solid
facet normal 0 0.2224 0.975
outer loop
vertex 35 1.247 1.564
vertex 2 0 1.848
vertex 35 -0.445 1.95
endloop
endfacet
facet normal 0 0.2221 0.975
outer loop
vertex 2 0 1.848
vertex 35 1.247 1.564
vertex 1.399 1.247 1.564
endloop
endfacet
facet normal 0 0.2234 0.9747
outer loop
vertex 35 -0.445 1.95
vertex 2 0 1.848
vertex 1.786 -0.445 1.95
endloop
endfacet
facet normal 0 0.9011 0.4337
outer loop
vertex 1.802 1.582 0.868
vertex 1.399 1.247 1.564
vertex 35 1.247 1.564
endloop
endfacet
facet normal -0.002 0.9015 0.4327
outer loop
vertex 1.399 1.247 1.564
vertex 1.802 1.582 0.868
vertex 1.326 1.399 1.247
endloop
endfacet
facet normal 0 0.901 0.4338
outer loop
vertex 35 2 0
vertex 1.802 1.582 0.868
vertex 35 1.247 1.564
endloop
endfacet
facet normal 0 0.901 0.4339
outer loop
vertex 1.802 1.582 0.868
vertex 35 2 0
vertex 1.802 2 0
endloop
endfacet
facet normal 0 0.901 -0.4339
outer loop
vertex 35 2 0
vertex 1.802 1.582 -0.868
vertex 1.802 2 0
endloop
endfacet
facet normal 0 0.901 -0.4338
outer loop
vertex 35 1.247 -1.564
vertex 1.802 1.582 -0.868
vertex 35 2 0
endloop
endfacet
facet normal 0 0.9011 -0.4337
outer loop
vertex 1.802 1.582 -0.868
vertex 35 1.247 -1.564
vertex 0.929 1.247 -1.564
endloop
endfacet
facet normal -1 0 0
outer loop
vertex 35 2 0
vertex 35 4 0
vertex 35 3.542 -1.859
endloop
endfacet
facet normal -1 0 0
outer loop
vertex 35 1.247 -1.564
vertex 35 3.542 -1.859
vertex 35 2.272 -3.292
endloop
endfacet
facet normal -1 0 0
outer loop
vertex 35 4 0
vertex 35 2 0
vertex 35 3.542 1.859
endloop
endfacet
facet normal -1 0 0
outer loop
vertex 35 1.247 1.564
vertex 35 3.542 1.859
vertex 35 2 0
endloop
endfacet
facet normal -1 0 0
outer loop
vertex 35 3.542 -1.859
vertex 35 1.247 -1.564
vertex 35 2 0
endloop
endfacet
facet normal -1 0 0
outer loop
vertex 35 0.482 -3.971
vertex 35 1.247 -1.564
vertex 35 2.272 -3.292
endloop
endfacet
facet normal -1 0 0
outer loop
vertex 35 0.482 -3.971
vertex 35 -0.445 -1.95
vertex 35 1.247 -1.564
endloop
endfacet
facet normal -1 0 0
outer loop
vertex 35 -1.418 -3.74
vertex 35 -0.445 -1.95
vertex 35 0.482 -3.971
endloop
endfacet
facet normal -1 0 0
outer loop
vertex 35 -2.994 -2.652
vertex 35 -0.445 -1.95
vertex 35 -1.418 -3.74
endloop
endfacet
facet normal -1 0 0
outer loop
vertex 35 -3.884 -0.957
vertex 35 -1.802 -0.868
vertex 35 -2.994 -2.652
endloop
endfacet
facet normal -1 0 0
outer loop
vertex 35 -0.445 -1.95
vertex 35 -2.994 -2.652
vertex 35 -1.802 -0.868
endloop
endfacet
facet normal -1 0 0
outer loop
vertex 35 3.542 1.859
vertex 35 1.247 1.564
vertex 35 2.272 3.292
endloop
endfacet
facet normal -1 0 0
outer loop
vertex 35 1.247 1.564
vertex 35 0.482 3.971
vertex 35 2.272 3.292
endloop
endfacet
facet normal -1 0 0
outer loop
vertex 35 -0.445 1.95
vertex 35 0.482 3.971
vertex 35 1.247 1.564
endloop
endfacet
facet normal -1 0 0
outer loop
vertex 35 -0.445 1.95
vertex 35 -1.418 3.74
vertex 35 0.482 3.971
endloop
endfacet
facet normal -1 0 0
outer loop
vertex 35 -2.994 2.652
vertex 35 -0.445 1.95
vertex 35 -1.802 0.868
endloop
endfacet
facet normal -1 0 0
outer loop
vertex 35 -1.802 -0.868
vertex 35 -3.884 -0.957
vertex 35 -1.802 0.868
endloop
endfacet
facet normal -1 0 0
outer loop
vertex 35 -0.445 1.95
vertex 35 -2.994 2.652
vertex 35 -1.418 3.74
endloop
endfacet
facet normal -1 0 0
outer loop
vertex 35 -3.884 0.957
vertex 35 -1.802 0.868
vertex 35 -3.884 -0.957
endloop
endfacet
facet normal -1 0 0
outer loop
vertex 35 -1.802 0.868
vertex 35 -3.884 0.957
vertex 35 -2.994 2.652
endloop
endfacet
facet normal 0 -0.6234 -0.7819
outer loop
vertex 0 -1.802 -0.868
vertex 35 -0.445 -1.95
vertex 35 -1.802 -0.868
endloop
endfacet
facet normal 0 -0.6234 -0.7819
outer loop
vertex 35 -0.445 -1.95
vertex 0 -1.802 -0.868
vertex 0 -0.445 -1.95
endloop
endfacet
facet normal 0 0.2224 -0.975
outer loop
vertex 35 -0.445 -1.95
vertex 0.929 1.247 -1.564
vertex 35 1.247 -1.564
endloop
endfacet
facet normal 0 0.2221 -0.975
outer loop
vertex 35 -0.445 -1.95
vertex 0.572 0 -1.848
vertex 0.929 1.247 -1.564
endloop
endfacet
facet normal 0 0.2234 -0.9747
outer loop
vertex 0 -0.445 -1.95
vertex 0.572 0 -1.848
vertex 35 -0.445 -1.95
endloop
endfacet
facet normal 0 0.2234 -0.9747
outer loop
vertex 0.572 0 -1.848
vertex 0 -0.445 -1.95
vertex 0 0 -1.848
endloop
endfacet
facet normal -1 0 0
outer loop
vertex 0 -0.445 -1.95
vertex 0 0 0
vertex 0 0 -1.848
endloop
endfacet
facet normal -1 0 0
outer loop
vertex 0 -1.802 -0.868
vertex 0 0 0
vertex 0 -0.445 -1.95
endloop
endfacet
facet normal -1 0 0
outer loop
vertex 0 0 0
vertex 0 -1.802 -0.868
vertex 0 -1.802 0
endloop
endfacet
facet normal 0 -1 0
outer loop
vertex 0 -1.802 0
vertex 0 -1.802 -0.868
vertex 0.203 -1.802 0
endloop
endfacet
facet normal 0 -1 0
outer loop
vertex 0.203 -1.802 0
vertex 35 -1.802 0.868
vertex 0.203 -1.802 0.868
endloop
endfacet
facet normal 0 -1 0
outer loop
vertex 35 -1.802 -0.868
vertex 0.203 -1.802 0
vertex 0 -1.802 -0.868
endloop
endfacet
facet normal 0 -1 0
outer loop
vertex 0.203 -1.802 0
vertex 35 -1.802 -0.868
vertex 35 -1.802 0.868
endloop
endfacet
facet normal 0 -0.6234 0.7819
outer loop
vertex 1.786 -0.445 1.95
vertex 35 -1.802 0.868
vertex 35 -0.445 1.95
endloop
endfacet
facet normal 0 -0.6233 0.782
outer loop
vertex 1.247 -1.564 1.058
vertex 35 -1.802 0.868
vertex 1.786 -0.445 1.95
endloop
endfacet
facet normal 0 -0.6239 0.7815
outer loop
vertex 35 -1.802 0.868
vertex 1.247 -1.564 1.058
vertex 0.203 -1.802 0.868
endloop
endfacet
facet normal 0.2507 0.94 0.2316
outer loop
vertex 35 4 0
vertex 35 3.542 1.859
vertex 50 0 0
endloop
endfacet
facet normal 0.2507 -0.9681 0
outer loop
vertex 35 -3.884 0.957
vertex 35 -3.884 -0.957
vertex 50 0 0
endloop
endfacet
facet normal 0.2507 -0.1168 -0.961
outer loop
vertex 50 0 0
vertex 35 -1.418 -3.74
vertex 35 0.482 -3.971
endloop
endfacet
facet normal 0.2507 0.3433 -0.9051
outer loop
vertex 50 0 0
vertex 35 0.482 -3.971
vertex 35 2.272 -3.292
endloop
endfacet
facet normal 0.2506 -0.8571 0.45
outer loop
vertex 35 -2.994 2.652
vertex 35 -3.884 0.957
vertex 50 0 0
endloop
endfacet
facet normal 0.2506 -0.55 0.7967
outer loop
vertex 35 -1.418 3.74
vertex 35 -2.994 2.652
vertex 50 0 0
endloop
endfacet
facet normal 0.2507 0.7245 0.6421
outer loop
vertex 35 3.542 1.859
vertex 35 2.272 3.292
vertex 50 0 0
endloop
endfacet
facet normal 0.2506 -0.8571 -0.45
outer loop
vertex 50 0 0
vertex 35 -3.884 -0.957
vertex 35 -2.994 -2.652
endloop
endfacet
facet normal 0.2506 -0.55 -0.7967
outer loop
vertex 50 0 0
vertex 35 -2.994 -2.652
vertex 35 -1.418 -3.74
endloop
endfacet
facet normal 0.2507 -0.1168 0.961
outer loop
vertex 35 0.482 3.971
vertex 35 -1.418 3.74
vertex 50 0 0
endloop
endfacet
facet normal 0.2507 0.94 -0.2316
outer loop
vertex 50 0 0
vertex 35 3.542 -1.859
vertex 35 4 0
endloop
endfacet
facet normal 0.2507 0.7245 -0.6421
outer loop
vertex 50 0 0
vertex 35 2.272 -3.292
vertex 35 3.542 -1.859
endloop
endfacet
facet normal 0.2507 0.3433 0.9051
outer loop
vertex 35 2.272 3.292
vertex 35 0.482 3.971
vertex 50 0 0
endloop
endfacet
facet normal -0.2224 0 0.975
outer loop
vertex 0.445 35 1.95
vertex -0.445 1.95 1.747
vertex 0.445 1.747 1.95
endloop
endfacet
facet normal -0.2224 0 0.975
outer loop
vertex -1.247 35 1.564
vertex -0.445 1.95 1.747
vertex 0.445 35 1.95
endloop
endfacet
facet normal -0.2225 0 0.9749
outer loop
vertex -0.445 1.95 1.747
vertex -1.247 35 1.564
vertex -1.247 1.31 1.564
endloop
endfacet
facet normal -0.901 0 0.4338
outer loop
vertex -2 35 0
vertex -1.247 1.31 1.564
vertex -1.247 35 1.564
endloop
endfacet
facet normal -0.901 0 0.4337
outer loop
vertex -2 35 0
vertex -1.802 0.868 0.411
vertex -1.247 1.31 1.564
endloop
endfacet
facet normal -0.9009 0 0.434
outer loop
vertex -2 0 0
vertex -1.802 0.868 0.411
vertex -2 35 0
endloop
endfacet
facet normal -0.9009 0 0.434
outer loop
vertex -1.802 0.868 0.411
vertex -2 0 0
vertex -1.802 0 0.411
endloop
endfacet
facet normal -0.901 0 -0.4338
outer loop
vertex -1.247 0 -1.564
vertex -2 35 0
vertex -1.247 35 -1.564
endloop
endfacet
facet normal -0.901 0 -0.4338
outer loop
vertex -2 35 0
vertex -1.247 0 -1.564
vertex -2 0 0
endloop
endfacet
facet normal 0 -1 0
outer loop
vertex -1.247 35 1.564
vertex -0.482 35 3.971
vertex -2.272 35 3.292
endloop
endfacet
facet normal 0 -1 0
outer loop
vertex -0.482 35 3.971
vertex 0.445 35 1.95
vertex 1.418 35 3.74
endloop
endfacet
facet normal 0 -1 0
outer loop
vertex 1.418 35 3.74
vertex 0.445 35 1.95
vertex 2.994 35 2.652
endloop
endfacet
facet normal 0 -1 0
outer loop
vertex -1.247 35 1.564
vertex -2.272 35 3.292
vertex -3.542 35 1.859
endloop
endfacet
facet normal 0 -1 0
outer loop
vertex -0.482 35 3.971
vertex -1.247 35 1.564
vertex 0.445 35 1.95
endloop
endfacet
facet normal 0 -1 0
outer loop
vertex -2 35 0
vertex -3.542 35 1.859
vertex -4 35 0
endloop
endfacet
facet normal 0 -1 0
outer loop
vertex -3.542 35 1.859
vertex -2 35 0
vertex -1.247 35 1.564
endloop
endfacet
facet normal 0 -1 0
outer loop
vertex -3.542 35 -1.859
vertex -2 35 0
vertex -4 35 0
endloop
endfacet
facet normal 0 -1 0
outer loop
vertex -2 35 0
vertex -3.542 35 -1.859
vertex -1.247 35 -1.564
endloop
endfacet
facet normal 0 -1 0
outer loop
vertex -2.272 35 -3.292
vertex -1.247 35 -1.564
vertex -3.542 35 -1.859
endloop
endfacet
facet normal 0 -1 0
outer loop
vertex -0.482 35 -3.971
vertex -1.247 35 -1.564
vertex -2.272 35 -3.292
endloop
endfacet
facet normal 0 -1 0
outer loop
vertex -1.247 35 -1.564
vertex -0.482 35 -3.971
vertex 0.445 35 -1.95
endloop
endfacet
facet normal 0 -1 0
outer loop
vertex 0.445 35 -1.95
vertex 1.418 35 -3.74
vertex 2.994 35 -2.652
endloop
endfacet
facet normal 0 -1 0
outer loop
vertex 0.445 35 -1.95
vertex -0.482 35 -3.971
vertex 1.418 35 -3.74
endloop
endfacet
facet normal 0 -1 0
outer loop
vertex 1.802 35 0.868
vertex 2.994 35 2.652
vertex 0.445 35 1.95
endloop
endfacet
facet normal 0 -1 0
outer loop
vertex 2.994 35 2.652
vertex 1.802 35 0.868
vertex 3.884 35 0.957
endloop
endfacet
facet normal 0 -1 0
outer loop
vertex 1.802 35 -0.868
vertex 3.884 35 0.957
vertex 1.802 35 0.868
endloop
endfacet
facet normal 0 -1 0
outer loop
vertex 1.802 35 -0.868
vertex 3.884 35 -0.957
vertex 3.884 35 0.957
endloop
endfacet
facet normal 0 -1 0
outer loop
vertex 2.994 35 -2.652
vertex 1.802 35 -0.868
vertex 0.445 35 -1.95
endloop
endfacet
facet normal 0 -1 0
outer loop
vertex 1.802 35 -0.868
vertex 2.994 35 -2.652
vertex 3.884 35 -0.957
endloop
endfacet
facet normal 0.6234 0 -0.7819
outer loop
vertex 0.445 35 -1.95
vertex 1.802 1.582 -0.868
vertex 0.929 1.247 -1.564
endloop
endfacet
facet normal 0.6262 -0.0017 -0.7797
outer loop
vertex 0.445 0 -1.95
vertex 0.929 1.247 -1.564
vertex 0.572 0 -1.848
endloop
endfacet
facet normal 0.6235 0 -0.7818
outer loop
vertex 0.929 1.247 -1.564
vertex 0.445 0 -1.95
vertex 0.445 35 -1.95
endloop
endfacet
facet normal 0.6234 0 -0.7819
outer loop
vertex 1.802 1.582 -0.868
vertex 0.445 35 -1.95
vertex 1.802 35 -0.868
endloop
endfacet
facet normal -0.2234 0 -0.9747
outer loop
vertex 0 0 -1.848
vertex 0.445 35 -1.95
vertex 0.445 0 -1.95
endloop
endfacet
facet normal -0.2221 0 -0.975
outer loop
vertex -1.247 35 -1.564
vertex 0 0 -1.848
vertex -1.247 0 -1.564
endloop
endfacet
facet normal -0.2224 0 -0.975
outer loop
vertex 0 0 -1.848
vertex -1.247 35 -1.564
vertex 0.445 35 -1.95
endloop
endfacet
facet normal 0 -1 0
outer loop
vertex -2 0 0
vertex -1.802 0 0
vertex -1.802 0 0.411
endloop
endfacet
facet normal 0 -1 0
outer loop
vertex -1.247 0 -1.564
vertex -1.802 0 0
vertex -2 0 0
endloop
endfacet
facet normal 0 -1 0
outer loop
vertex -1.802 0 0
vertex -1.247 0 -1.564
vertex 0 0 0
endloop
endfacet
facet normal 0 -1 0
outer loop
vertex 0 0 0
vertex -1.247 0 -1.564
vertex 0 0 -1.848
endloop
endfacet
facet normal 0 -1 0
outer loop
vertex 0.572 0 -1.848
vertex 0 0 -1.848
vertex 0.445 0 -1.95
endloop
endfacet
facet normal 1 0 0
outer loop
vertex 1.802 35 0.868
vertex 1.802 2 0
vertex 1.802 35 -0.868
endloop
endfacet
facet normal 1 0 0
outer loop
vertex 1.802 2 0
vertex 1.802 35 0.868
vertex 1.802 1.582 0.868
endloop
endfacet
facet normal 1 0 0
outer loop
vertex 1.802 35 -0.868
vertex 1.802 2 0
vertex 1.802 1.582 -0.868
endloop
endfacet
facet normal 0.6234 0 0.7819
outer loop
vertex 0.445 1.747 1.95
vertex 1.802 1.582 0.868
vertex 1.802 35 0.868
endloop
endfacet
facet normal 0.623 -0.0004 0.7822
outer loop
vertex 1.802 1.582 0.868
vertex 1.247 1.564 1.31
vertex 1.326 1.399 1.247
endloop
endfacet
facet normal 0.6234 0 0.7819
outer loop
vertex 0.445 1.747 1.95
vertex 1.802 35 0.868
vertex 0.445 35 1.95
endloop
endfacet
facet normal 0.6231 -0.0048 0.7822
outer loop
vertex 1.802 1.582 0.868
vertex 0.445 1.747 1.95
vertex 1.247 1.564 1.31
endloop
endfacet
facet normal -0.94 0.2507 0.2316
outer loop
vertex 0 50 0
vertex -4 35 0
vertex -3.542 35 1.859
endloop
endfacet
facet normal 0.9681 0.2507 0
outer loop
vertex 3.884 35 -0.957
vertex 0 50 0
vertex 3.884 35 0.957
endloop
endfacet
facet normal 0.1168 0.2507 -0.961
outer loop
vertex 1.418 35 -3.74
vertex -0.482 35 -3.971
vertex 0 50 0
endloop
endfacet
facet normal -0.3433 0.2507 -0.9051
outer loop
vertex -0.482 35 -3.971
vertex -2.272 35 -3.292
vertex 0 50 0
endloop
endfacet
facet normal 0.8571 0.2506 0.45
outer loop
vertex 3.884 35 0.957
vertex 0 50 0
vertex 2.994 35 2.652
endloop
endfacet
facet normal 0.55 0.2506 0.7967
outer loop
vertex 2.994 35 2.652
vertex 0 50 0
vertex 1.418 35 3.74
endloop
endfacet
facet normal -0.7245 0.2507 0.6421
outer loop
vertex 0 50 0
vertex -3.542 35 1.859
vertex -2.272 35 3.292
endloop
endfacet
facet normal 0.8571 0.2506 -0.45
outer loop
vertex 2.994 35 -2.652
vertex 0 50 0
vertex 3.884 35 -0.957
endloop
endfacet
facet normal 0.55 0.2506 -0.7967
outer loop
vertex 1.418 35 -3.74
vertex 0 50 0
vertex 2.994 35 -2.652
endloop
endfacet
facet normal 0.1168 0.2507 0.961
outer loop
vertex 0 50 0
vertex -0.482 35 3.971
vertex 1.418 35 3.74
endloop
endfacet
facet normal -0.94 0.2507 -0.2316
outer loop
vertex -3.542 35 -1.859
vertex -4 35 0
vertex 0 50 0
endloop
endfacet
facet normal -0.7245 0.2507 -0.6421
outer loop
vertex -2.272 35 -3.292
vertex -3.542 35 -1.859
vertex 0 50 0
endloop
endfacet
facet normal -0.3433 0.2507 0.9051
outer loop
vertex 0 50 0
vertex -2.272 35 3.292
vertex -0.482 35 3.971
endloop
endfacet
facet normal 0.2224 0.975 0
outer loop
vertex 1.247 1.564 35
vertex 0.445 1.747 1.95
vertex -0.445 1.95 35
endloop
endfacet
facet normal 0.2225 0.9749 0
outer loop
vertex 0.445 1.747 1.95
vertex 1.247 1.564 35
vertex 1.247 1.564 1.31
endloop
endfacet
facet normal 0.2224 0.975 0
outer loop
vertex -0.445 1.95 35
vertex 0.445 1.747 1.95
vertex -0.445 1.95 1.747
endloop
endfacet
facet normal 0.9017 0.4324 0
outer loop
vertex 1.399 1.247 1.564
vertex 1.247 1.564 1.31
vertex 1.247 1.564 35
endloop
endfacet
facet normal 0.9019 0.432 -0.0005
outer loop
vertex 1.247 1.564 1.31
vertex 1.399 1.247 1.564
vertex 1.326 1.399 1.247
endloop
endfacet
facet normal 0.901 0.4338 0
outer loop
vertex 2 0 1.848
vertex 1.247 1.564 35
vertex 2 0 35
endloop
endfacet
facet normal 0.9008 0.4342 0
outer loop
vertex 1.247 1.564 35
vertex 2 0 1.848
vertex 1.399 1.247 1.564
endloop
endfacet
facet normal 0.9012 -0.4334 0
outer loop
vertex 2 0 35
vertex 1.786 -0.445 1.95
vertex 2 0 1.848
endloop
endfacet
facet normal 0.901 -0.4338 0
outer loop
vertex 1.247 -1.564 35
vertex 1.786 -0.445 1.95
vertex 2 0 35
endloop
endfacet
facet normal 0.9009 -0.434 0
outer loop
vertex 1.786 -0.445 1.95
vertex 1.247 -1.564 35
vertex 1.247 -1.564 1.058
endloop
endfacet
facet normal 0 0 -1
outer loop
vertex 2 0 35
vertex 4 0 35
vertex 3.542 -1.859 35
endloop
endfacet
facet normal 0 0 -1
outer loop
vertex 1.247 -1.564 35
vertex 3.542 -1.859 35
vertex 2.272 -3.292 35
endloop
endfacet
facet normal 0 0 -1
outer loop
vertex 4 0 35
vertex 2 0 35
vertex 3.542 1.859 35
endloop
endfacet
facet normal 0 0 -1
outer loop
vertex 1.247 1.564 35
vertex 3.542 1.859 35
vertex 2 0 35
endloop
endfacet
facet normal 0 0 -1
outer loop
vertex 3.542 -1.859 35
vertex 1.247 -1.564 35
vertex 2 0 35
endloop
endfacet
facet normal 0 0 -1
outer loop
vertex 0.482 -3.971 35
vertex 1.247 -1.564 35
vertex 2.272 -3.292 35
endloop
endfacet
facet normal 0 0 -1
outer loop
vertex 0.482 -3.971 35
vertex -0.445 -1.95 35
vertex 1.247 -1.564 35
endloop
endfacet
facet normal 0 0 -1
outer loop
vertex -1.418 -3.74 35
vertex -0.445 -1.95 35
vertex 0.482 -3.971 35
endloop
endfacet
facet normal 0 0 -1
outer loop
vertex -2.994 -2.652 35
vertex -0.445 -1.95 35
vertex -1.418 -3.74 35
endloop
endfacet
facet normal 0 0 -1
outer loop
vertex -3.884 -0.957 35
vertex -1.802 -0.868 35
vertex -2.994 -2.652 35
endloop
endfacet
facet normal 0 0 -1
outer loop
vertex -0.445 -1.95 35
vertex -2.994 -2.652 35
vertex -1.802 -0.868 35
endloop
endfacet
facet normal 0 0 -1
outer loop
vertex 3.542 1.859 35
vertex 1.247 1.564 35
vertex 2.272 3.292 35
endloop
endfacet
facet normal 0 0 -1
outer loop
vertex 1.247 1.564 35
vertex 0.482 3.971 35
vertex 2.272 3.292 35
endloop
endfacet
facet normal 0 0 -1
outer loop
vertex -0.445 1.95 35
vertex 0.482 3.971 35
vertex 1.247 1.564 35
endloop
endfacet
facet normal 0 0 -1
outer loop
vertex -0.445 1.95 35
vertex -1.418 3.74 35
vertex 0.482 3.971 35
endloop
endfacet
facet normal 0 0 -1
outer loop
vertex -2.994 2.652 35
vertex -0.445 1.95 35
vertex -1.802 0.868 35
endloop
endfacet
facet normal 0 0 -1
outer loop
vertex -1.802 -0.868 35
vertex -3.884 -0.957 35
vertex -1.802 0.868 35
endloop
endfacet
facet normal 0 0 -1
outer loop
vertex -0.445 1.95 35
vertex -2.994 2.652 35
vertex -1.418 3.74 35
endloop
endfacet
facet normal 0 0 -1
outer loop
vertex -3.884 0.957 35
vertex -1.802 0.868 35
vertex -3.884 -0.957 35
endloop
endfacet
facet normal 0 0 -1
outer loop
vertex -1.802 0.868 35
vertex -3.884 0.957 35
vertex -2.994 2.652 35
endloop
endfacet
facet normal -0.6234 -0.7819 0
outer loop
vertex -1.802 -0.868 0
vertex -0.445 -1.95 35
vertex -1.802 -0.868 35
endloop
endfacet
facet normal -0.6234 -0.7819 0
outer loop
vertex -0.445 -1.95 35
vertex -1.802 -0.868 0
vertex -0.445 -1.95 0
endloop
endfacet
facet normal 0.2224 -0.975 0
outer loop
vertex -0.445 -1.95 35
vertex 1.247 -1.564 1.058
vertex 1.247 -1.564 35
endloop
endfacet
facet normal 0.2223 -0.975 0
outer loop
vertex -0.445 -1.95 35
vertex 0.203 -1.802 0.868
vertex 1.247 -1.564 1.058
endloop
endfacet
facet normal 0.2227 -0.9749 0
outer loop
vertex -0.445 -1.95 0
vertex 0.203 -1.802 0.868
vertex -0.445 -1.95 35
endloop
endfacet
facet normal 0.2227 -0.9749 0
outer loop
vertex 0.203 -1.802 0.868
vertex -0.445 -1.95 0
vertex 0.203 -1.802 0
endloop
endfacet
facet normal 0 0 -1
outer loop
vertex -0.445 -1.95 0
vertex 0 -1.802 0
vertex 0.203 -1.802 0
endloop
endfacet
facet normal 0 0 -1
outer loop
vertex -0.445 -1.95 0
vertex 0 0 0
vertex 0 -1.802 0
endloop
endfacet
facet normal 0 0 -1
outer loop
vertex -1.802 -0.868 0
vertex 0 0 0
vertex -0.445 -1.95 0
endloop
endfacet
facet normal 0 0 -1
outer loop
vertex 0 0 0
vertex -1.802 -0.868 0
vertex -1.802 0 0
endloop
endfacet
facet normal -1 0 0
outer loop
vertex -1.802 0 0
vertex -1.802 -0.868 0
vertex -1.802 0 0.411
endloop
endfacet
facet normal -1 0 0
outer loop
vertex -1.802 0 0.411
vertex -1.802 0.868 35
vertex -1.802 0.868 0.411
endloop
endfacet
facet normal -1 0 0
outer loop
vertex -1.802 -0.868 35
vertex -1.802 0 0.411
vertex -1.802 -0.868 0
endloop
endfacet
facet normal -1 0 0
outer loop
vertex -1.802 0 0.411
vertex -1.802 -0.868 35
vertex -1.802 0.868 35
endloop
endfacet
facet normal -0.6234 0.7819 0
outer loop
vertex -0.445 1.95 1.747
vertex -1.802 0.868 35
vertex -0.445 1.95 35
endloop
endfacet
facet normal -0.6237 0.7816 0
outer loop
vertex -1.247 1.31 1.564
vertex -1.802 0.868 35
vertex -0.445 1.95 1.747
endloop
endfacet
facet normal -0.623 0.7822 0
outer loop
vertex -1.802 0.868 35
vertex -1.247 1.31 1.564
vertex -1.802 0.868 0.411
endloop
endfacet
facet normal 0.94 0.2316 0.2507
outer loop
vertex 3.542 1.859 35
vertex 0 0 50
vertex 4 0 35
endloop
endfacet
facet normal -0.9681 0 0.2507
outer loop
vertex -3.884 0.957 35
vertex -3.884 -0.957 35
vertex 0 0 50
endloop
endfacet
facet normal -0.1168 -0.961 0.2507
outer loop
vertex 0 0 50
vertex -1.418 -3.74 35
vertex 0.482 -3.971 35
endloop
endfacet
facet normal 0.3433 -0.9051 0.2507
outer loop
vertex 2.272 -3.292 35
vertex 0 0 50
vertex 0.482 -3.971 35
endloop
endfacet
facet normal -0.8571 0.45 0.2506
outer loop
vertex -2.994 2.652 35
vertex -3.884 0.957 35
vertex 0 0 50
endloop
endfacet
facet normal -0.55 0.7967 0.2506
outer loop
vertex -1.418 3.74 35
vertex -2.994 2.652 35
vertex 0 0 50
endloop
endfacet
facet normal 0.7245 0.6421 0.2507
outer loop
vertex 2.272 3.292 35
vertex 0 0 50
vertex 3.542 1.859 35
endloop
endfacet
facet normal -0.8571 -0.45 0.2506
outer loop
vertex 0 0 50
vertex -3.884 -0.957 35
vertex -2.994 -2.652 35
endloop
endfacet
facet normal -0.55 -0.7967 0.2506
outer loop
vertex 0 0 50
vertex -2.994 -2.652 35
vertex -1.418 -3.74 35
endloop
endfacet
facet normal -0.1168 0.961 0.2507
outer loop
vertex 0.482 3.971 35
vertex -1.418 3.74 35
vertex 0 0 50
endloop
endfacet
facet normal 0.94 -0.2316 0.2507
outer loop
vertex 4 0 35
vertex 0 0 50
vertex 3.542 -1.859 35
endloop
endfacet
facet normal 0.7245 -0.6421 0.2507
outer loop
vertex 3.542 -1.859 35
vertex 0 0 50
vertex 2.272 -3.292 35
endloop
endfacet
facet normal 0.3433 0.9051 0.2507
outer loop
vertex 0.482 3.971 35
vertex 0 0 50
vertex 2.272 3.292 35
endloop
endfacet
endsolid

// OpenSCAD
// Module axis_arrows renders three arrows showing
// the X, Y and Z axes.
// Author: James Synge

//// Global resolution
//// Don't generate smaller facets than this many mm.
//$fs = 0.5;
//// Don't generate larger angles than this many degrees.
//$fa = 1;

color("green") axis_arrows();

// Draws an arrow from the origin along the Z axis.
module arrow(total_length=50, shaft_radius=2,
             head_length=15, head_radius=4, message="") {
  assert(total_length > head_length);
  assert(shaft_radius <= head_radius);
  shaft_length = total_length-head_length;
  cylinder(h=shaft_length, r=shaft_radius);
  translate([0,0,shaft_length])
    cylinder(h=head_length, r1=head_radius, r2=0);
  if (message != "") {
    // echo("message is set");
    translate([0,0,total_length])
      text(message, halign="center", valign="center");
  } else {
    // echo("no message");
  }
}

module axis_arrows(total_length=50, shaft_radius=2,
                   head_length=15, head_radius=4) {
  rotate([0,90,0])
    rotate([0,0,90])
      arrow(message="X",
            total_length=total_length,
            shaft_radius=shaft_radius,
            head_length=head_length,
            head_radius=head_radius);
  rotate([-90,180,0])
    arrow(message="Y",
          total_length=total_length,
          shaft_radius=shaft_radius,
          head_length=head_length,
          head_radius=head_radius);
  arrow(message="Z",
        total_length=total_length,
        shaft_radius=shaft_radius,
        head_length=head_length,
        head_radius=head_radius);
}
